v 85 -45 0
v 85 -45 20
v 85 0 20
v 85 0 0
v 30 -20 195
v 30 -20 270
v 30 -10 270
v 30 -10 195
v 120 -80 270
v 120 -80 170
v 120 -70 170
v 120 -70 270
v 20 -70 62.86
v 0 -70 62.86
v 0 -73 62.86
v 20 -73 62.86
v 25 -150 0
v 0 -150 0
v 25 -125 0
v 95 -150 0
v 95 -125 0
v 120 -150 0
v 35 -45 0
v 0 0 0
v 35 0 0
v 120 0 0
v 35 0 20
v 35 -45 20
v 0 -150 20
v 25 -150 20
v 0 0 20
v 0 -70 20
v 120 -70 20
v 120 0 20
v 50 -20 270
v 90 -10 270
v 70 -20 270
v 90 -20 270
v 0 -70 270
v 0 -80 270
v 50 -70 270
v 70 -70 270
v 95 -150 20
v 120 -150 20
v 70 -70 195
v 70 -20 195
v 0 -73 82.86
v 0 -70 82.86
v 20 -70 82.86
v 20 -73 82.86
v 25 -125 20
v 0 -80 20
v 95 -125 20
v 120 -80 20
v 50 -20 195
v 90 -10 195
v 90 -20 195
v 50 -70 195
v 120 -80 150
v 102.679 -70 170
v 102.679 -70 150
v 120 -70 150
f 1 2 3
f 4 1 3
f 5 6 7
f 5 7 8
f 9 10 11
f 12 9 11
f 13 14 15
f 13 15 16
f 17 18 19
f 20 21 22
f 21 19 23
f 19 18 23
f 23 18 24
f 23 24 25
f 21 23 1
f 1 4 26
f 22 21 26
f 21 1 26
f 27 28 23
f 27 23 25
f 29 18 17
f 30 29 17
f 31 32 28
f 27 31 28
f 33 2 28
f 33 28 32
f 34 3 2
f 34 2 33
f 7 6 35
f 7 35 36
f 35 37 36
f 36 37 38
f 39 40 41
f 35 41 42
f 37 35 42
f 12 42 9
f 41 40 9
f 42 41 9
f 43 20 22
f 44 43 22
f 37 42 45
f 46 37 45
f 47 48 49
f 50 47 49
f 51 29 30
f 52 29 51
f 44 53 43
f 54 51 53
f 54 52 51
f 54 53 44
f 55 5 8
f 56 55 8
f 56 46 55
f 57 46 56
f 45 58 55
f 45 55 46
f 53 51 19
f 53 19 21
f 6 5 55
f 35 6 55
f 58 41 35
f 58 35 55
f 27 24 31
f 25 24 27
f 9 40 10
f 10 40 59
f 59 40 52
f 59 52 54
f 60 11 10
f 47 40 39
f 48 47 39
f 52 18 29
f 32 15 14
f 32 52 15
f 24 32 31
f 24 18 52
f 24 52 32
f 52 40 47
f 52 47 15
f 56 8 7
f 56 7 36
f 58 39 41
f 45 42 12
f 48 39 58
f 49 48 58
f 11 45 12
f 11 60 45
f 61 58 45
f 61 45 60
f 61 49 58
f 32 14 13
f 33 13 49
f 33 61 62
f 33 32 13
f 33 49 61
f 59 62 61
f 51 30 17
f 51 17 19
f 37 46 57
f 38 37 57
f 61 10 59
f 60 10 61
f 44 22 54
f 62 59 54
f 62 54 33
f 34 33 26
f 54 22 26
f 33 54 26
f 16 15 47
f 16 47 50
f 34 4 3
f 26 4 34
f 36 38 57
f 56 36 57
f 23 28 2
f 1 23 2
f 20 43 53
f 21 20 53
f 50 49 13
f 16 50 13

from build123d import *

# Parameters (mm, degrees)
SKETCH_1_W          = 120
SKETCH_1_H          = 150
EXTRUDE_1_DEPTH     = 20
SKETCH_2_W          = 120
SKETCH_2_H          = 10
EXTRUDE_3_DEPTH     = 250
SKETCH_3_W          = 50
SKETCH_3_H          = 45
CUT_EXTRUDE_1_DEPTH = 316.277655409
SKETCH_4_W          = 70
SKETCH_4_H          = 25
CUT_EXTRUDE_2_DEPTH = 316.277655409
SKETCH_5_W          = 20
SKETCH_5_H          = 20
CUT_EXTRUDE_3_DEPTH = 3
CUT_EXTRUDE_START   = -100
CUT_EXTRUDE_6_DEPTH = 20
SKETCH_7_W          = 20
SKETCH_7_H          = 75
EXTRUDE_4_DEPTH     = 50
SKETCH_8_W          = 60
SKETCH_8_H          = 75
EXTRUDE_5_DEPTH     = 10


with BuildPart() as part:
    # Эскиз1 → Бобышка-Вытянуть1 (new body)
    with BuildSketch(Plane.XY):
        with Locations((60, -75)):
            Rectangle(SKETCH_1_W, SKETCH_1_H)
    extrude(amount=EXTRUDE_1_DEPTH)

    # Эскиз2 → Бобышка-Вытянуть3 (add)
    with BuildSketch(Plane.XY.offset(20)):
        with Locations((60, -75)):
            Rectangle(SKETCH_2_W, SKETCH_2_H)
    extrude(amount=EXTRUDE_3_DEPTH)

    # Эскиз3 → Вырез-Вытянуть1 (cut, through all)
    with BuildSketch(Plane.XY.offset(20)):
        with Locations((60, -22.5)):
            Rectangle(SKETCH_3_W, SKETCH_3_H)
    extrude(amount=-CUT_EXTRUDE_1_DEPTH, mode=Mode.SUBTRACT)

    # Эскиз4 → Вырез-Вытянуть2 (cut, through all)
    with BuildSketch(Plane.XY.offset(20)):
        with Locations((60, -137.5)):
            Rectangle(SKETCH_4_W, SKETCH_4_H)
    extrude(amount=-CUT_EXTRUDE_2_DEPTH, mode=Mode.SUBTRACT)

    # Эскиз5 → Вырез-Вытянуть3 (cut)
    with BuildSketch(Plane(origin=(0, -70, 0), x_dir=(1, 0, 0), z_dir=(0, 1, 0))):
        with Locations((10, -72.859885292)):
            Rectangle(SKETCH_5_W, SKETCH_5_H)
    extrude(amount=-CUT_EXTRUDE_3_DEPTH, mode=Mode.SUBTRACT)

    # Эскиз6 → Вырез-Вытянуть6 (cut)
    with BuildSketch(Plane.XY.offset(270).offset(CUT_EXTRUDE_START)):
        Polygon((120, -80), (102.679491924, -70), (120, -70), align=None)
    extrude(amount=-CUT_EXTRUDE_6_DEPTH, mode=Mode.SUBTRACT)

    # Эскиз7 → Бобышка-Вытянуть4 (add)
    with BuildSketch(Plane(origin=(0, -70, 0), x_dir=(1, 0, 0), z_dir=(0, 1, 0))):
        with Locations((60, -232.5)):
            Rectangle(SKETCH_7_W, SKETCH_7_H)
    extrude(amount=EXTRUDE_4_DEPTH)

    # Эскиз8 → Бобышка-Вытянуть5 (add)
    with BuildSketch(Plane(origin=(0, -20, 0), x_dir=(1, 0, 0), z_dir=(0, 1, 0))):
        with Locations((60, -232.5)):
            Rectangle(SKETCH_8_W, SKETCH_8_H)
    extrude(amount=EXTRUDE_5_DEPTH)


solid = part.part
